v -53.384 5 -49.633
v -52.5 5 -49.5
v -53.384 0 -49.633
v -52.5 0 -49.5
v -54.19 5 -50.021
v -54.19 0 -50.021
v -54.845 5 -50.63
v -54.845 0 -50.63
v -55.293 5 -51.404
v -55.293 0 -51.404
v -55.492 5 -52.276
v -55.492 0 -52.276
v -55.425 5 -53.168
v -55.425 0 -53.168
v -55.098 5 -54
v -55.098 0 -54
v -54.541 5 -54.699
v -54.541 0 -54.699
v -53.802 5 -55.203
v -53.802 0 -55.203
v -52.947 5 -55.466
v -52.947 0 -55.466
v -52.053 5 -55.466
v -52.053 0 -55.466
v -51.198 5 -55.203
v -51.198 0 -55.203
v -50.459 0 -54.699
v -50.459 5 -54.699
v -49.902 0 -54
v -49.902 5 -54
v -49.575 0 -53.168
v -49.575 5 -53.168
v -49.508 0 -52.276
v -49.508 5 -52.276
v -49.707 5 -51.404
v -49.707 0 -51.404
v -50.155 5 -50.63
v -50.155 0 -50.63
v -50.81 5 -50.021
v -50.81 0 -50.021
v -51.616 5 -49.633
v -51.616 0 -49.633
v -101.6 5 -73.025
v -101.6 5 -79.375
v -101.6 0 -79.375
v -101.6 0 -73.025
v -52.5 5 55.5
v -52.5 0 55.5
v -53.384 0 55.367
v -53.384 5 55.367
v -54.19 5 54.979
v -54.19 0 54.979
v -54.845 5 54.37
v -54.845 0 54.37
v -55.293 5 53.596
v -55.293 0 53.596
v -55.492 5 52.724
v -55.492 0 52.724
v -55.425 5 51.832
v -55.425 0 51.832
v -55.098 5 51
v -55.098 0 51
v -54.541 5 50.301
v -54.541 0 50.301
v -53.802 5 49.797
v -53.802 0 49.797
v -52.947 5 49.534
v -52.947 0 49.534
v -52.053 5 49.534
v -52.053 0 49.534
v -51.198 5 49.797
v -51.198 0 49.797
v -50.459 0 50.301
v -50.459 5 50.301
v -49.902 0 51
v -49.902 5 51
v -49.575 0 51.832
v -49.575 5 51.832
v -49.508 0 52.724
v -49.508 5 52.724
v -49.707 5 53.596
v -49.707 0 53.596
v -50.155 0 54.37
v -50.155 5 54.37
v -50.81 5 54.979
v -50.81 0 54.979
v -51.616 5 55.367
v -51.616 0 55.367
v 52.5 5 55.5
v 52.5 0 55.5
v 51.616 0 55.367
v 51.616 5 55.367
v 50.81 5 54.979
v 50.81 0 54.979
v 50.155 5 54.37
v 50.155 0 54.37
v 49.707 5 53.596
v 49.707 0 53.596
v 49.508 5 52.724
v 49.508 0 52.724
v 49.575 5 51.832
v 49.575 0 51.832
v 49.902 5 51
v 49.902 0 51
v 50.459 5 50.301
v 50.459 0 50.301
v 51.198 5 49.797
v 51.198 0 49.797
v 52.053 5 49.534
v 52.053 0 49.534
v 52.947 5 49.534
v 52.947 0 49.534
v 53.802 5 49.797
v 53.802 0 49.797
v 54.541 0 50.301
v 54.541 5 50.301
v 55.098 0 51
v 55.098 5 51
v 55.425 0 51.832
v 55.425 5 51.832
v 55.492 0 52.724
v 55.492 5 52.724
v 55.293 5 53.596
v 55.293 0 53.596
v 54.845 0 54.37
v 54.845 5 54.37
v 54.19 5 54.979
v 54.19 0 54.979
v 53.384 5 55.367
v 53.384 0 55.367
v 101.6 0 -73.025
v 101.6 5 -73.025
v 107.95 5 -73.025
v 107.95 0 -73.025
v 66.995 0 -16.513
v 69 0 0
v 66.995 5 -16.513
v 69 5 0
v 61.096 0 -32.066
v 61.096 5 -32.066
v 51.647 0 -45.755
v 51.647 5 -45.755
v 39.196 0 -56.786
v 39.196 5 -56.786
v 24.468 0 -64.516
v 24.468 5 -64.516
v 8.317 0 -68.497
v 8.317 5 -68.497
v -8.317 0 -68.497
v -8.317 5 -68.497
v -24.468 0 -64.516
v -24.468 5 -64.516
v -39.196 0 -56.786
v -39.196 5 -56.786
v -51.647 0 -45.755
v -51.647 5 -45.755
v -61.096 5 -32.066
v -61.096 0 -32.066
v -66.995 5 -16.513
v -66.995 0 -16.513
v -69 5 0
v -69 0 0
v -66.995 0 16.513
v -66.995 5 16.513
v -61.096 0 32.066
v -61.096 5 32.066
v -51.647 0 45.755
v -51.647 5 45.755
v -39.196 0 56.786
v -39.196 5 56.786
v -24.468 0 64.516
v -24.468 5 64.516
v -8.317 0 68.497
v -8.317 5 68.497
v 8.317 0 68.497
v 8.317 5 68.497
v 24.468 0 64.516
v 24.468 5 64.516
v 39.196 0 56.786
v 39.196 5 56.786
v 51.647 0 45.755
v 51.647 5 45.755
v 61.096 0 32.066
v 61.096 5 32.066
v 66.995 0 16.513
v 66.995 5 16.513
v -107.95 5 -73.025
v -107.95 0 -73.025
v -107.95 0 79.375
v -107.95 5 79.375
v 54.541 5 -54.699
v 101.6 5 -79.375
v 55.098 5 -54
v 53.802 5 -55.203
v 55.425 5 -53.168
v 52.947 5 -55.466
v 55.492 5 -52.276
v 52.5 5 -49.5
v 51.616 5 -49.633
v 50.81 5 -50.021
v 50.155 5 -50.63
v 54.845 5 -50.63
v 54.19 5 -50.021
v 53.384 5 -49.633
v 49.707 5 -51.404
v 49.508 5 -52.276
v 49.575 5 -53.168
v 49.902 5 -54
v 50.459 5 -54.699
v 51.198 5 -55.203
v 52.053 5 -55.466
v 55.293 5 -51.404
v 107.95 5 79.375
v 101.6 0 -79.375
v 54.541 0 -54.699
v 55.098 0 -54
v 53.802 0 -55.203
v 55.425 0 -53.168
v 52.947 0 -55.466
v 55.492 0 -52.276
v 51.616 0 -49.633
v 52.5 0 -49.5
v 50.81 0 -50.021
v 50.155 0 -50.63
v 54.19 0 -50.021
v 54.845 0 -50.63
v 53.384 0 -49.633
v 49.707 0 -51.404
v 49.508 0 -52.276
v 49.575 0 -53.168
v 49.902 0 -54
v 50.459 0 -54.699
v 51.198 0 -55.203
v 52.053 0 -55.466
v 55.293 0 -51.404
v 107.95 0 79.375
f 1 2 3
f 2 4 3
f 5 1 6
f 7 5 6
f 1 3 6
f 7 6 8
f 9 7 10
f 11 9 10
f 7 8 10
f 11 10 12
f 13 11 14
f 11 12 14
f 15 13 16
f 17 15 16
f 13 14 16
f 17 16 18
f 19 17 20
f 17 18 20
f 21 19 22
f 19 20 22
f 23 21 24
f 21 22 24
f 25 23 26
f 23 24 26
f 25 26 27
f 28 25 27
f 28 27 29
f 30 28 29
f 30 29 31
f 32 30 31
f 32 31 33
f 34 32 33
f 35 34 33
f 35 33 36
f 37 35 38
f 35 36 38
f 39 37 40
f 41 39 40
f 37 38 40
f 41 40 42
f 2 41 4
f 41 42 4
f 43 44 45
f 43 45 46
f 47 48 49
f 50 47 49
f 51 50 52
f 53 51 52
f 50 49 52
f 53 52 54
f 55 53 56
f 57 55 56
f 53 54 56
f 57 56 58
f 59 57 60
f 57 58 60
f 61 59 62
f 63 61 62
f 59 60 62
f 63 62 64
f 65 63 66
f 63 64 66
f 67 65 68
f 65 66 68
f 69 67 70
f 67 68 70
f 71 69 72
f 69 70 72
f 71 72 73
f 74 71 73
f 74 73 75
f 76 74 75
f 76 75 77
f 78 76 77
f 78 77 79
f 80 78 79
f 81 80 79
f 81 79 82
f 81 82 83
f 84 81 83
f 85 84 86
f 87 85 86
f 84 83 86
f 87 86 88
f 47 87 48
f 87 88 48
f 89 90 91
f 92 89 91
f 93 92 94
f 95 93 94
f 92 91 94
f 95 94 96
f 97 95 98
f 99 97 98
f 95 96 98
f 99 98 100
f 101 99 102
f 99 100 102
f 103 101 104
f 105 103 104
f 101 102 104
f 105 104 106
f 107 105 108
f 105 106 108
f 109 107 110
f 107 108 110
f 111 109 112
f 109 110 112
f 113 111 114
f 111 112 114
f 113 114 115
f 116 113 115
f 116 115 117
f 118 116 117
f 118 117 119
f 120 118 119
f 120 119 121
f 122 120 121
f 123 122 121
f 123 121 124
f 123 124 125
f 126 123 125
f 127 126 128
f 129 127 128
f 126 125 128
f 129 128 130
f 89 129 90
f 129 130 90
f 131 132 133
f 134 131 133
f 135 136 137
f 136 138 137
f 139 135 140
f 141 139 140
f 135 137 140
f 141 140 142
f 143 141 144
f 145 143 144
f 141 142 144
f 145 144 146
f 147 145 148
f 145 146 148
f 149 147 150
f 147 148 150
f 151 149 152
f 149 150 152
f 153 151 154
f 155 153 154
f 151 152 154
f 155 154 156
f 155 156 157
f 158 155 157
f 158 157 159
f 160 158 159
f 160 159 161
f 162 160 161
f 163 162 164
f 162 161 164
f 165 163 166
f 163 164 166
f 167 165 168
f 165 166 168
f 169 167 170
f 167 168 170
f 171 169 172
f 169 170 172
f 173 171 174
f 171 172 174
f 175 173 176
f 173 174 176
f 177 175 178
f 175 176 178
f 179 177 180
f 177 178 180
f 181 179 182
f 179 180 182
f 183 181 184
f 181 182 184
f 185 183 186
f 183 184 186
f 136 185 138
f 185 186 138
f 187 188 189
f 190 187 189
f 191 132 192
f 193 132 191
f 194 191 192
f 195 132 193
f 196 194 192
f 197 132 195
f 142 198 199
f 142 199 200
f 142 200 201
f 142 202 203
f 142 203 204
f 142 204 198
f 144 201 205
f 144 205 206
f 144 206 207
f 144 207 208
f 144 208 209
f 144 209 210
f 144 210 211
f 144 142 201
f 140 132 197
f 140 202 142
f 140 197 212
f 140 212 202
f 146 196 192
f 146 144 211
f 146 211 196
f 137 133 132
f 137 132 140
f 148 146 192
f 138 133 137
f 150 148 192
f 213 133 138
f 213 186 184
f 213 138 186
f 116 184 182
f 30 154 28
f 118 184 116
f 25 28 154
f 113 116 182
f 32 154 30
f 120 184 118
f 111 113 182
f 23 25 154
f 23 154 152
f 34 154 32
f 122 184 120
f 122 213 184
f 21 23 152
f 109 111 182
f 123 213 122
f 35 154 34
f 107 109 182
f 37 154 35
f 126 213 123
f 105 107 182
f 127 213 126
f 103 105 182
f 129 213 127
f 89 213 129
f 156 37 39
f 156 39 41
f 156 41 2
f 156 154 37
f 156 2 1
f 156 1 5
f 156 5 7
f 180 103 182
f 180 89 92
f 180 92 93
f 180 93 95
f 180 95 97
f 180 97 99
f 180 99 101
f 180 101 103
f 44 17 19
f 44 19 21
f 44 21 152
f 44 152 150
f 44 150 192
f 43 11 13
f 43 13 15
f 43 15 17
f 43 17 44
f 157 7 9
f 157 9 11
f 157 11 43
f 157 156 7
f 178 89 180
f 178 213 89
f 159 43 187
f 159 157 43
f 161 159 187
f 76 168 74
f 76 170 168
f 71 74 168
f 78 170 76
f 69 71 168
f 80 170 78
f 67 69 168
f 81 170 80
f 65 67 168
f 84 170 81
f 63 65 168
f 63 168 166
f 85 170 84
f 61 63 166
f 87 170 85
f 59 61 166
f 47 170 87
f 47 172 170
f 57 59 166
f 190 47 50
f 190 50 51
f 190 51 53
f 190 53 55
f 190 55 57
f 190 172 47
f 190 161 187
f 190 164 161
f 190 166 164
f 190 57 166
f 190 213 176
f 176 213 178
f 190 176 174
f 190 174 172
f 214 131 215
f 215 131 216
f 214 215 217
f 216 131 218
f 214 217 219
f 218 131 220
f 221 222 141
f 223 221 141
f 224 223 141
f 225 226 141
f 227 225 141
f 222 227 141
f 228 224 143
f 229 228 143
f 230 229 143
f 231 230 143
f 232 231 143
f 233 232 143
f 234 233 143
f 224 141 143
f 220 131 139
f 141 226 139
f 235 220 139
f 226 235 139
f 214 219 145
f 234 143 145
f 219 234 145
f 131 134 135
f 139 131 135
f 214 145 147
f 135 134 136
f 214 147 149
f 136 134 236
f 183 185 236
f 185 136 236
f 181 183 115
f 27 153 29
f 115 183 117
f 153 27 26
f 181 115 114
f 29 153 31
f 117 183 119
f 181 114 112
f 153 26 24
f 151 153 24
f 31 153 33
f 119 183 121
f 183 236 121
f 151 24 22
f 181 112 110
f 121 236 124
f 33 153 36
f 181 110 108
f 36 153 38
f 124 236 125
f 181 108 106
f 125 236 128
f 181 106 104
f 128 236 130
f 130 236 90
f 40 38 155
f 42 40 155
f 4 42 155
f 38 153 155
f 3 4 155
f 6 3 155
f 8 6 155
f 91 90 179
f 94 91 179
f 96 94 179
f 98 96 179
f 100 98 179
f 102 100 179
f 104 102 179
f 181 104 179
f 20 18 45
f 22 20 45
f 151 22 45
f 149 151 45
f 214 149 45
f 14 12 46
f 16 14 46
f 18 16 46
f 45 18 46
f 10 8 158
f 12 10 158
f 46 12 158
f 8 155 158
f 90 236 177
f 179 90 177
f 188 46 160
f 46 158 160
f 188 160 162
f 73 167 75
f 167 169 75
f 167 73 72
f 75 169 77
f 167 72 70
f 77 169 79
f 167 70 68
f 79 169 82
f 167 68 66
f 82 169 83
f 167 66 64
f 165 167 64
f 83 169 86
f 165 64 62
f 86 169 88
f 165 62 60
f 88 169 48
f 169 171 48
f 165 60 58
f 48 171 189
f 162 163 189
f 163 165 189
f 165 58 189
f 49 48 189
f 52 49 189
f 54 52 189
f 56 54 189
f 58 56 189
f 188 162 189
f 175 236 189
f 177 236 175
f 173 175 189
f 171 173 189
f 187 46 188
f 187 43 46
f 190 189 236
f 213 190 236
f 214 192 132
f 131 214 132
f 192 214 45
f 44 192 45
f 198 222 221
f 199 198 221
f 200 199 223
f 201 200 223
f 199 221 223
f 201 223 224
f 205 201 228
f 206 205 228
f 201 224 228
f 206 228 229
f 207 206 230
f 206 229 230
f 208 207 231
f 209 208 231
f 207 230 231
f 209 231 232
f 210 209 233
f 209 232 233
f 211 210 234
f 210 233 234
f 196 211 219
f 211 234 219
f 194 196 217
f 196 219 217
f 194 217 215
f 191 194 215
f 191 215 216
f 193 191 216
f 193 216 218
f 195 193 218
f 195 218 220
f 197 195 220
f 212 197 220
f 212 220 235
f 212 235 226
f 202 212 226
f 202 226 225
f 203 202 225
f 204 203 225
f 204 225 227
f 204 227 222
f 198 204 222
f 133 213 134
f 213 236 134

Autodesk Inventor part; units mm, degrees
ref_plane "YZ Plane" through (0, 0, 0) normal (1, 0, 0) x (0, 1, 0)
ref_plane "XZ Plane" through (0, 0, 0) normal (0, 1, 0) x (-1, 0, 0)
ref_plane "XY Plane" through (0, 0, 0) normal (0, 0, 1) x (1, 0, 0)
sketch "Sketch1" plane through (0, 0, 0) normal (0, 1, 0) x (-1, 0, 0)
  line L0 (107.95, 79.375) -> (-107.95, 79.375)
  line L1 (-107.95, 79.375) -> (-107.95, -79.375)
  line L2 (-107.95, -79.375) -> (107.95, -79.375)
  line L3 (107.95, -79.375) -> (107.95, 79.375)
  line L4 (107.95, 79.375) -> (-107.95, -79.375) construction
  line L5 (-107.95, 79.375) -> (107.95, -79.375) construction
  point P0 (0, 0)
  dimension "d0" = 215.9
  dimension "d1" = 158.75
extrude "Extrusion1" add sketch "Sketch1" along normal blind 5
sketch "Sketch2" plane through (0, 5, 0) normal (0, 1, 0) x (1, 0, 0)
  line L0 (107.95, 79.375) -> (-107.95, 79.375) projected
  line L1 (-107.95, 79.375) -> (-101.6, 79.375)
  line L2 (-101.6, 79.375) -> (-101.6, 73.025)
  line L3 (-101.6, 73.025) -> (-107.95, 73.025)
  line L4 (-107.95, 73.025) -> (-107.95, 79.375)
  line L5 (107.95, 79.375) -> (101.6, 79.375)
  line L6 (101.6, 79.375) -> (101.6, 73.025)
  line L7 (101.6, 73.025) -> (107.95, 73.025)
  line L8 (107.95, 73.025) -> (107.95, 79.375)
  point P0 (0, 0)
  dimension "d4" = 6.35
  dimension "d5" = 6.35
  dimension "d6" = 6.35
  dimension "d7" = 6.35
extrude "Extrusion2" cut sketch "Sketch2" against normal up to next
sketch "Sketch3" plane through (0, 5, 0) normal (0, 1, 0) x (1, 0, 0)
  point P0 (0, 0)
  point P1 (-52.5, 52.5)
  point P2 (-52.5, -52.5)
  point P3 (52.5, -52.5)
  point P4 (52.5, 52.5)
  dimension "d17" = 105
  dimension "d18" = 105
  dimension "d19" = 52.5
  dimension "d20" = 52.5
  dimension "d21" = 105
  dimension "d22" = 52.5
  dimension "d23" = 105
  dimension "d24" = 52.5
hole "Hole1" at (-52.5, 5, -52.5) at (-52.5, 5, 52.5) at (52.5, 5, 52.5) at (52.5, 5, -52.5) direction (0, -1, 0) diameter 6 depth 10.9728 tip angle 118
sketch "Sketch4" plane through (0, 5, 0) normal (0, 1, 0) x (1, 0, 0)
  circle A0 centre (0, 0) radius 69
  dimension "d25" = 138
extrude "Extrusion3" cut sketch "Sketch4" against normal up to next
properties part number "PowerSupplyEncEnds"
